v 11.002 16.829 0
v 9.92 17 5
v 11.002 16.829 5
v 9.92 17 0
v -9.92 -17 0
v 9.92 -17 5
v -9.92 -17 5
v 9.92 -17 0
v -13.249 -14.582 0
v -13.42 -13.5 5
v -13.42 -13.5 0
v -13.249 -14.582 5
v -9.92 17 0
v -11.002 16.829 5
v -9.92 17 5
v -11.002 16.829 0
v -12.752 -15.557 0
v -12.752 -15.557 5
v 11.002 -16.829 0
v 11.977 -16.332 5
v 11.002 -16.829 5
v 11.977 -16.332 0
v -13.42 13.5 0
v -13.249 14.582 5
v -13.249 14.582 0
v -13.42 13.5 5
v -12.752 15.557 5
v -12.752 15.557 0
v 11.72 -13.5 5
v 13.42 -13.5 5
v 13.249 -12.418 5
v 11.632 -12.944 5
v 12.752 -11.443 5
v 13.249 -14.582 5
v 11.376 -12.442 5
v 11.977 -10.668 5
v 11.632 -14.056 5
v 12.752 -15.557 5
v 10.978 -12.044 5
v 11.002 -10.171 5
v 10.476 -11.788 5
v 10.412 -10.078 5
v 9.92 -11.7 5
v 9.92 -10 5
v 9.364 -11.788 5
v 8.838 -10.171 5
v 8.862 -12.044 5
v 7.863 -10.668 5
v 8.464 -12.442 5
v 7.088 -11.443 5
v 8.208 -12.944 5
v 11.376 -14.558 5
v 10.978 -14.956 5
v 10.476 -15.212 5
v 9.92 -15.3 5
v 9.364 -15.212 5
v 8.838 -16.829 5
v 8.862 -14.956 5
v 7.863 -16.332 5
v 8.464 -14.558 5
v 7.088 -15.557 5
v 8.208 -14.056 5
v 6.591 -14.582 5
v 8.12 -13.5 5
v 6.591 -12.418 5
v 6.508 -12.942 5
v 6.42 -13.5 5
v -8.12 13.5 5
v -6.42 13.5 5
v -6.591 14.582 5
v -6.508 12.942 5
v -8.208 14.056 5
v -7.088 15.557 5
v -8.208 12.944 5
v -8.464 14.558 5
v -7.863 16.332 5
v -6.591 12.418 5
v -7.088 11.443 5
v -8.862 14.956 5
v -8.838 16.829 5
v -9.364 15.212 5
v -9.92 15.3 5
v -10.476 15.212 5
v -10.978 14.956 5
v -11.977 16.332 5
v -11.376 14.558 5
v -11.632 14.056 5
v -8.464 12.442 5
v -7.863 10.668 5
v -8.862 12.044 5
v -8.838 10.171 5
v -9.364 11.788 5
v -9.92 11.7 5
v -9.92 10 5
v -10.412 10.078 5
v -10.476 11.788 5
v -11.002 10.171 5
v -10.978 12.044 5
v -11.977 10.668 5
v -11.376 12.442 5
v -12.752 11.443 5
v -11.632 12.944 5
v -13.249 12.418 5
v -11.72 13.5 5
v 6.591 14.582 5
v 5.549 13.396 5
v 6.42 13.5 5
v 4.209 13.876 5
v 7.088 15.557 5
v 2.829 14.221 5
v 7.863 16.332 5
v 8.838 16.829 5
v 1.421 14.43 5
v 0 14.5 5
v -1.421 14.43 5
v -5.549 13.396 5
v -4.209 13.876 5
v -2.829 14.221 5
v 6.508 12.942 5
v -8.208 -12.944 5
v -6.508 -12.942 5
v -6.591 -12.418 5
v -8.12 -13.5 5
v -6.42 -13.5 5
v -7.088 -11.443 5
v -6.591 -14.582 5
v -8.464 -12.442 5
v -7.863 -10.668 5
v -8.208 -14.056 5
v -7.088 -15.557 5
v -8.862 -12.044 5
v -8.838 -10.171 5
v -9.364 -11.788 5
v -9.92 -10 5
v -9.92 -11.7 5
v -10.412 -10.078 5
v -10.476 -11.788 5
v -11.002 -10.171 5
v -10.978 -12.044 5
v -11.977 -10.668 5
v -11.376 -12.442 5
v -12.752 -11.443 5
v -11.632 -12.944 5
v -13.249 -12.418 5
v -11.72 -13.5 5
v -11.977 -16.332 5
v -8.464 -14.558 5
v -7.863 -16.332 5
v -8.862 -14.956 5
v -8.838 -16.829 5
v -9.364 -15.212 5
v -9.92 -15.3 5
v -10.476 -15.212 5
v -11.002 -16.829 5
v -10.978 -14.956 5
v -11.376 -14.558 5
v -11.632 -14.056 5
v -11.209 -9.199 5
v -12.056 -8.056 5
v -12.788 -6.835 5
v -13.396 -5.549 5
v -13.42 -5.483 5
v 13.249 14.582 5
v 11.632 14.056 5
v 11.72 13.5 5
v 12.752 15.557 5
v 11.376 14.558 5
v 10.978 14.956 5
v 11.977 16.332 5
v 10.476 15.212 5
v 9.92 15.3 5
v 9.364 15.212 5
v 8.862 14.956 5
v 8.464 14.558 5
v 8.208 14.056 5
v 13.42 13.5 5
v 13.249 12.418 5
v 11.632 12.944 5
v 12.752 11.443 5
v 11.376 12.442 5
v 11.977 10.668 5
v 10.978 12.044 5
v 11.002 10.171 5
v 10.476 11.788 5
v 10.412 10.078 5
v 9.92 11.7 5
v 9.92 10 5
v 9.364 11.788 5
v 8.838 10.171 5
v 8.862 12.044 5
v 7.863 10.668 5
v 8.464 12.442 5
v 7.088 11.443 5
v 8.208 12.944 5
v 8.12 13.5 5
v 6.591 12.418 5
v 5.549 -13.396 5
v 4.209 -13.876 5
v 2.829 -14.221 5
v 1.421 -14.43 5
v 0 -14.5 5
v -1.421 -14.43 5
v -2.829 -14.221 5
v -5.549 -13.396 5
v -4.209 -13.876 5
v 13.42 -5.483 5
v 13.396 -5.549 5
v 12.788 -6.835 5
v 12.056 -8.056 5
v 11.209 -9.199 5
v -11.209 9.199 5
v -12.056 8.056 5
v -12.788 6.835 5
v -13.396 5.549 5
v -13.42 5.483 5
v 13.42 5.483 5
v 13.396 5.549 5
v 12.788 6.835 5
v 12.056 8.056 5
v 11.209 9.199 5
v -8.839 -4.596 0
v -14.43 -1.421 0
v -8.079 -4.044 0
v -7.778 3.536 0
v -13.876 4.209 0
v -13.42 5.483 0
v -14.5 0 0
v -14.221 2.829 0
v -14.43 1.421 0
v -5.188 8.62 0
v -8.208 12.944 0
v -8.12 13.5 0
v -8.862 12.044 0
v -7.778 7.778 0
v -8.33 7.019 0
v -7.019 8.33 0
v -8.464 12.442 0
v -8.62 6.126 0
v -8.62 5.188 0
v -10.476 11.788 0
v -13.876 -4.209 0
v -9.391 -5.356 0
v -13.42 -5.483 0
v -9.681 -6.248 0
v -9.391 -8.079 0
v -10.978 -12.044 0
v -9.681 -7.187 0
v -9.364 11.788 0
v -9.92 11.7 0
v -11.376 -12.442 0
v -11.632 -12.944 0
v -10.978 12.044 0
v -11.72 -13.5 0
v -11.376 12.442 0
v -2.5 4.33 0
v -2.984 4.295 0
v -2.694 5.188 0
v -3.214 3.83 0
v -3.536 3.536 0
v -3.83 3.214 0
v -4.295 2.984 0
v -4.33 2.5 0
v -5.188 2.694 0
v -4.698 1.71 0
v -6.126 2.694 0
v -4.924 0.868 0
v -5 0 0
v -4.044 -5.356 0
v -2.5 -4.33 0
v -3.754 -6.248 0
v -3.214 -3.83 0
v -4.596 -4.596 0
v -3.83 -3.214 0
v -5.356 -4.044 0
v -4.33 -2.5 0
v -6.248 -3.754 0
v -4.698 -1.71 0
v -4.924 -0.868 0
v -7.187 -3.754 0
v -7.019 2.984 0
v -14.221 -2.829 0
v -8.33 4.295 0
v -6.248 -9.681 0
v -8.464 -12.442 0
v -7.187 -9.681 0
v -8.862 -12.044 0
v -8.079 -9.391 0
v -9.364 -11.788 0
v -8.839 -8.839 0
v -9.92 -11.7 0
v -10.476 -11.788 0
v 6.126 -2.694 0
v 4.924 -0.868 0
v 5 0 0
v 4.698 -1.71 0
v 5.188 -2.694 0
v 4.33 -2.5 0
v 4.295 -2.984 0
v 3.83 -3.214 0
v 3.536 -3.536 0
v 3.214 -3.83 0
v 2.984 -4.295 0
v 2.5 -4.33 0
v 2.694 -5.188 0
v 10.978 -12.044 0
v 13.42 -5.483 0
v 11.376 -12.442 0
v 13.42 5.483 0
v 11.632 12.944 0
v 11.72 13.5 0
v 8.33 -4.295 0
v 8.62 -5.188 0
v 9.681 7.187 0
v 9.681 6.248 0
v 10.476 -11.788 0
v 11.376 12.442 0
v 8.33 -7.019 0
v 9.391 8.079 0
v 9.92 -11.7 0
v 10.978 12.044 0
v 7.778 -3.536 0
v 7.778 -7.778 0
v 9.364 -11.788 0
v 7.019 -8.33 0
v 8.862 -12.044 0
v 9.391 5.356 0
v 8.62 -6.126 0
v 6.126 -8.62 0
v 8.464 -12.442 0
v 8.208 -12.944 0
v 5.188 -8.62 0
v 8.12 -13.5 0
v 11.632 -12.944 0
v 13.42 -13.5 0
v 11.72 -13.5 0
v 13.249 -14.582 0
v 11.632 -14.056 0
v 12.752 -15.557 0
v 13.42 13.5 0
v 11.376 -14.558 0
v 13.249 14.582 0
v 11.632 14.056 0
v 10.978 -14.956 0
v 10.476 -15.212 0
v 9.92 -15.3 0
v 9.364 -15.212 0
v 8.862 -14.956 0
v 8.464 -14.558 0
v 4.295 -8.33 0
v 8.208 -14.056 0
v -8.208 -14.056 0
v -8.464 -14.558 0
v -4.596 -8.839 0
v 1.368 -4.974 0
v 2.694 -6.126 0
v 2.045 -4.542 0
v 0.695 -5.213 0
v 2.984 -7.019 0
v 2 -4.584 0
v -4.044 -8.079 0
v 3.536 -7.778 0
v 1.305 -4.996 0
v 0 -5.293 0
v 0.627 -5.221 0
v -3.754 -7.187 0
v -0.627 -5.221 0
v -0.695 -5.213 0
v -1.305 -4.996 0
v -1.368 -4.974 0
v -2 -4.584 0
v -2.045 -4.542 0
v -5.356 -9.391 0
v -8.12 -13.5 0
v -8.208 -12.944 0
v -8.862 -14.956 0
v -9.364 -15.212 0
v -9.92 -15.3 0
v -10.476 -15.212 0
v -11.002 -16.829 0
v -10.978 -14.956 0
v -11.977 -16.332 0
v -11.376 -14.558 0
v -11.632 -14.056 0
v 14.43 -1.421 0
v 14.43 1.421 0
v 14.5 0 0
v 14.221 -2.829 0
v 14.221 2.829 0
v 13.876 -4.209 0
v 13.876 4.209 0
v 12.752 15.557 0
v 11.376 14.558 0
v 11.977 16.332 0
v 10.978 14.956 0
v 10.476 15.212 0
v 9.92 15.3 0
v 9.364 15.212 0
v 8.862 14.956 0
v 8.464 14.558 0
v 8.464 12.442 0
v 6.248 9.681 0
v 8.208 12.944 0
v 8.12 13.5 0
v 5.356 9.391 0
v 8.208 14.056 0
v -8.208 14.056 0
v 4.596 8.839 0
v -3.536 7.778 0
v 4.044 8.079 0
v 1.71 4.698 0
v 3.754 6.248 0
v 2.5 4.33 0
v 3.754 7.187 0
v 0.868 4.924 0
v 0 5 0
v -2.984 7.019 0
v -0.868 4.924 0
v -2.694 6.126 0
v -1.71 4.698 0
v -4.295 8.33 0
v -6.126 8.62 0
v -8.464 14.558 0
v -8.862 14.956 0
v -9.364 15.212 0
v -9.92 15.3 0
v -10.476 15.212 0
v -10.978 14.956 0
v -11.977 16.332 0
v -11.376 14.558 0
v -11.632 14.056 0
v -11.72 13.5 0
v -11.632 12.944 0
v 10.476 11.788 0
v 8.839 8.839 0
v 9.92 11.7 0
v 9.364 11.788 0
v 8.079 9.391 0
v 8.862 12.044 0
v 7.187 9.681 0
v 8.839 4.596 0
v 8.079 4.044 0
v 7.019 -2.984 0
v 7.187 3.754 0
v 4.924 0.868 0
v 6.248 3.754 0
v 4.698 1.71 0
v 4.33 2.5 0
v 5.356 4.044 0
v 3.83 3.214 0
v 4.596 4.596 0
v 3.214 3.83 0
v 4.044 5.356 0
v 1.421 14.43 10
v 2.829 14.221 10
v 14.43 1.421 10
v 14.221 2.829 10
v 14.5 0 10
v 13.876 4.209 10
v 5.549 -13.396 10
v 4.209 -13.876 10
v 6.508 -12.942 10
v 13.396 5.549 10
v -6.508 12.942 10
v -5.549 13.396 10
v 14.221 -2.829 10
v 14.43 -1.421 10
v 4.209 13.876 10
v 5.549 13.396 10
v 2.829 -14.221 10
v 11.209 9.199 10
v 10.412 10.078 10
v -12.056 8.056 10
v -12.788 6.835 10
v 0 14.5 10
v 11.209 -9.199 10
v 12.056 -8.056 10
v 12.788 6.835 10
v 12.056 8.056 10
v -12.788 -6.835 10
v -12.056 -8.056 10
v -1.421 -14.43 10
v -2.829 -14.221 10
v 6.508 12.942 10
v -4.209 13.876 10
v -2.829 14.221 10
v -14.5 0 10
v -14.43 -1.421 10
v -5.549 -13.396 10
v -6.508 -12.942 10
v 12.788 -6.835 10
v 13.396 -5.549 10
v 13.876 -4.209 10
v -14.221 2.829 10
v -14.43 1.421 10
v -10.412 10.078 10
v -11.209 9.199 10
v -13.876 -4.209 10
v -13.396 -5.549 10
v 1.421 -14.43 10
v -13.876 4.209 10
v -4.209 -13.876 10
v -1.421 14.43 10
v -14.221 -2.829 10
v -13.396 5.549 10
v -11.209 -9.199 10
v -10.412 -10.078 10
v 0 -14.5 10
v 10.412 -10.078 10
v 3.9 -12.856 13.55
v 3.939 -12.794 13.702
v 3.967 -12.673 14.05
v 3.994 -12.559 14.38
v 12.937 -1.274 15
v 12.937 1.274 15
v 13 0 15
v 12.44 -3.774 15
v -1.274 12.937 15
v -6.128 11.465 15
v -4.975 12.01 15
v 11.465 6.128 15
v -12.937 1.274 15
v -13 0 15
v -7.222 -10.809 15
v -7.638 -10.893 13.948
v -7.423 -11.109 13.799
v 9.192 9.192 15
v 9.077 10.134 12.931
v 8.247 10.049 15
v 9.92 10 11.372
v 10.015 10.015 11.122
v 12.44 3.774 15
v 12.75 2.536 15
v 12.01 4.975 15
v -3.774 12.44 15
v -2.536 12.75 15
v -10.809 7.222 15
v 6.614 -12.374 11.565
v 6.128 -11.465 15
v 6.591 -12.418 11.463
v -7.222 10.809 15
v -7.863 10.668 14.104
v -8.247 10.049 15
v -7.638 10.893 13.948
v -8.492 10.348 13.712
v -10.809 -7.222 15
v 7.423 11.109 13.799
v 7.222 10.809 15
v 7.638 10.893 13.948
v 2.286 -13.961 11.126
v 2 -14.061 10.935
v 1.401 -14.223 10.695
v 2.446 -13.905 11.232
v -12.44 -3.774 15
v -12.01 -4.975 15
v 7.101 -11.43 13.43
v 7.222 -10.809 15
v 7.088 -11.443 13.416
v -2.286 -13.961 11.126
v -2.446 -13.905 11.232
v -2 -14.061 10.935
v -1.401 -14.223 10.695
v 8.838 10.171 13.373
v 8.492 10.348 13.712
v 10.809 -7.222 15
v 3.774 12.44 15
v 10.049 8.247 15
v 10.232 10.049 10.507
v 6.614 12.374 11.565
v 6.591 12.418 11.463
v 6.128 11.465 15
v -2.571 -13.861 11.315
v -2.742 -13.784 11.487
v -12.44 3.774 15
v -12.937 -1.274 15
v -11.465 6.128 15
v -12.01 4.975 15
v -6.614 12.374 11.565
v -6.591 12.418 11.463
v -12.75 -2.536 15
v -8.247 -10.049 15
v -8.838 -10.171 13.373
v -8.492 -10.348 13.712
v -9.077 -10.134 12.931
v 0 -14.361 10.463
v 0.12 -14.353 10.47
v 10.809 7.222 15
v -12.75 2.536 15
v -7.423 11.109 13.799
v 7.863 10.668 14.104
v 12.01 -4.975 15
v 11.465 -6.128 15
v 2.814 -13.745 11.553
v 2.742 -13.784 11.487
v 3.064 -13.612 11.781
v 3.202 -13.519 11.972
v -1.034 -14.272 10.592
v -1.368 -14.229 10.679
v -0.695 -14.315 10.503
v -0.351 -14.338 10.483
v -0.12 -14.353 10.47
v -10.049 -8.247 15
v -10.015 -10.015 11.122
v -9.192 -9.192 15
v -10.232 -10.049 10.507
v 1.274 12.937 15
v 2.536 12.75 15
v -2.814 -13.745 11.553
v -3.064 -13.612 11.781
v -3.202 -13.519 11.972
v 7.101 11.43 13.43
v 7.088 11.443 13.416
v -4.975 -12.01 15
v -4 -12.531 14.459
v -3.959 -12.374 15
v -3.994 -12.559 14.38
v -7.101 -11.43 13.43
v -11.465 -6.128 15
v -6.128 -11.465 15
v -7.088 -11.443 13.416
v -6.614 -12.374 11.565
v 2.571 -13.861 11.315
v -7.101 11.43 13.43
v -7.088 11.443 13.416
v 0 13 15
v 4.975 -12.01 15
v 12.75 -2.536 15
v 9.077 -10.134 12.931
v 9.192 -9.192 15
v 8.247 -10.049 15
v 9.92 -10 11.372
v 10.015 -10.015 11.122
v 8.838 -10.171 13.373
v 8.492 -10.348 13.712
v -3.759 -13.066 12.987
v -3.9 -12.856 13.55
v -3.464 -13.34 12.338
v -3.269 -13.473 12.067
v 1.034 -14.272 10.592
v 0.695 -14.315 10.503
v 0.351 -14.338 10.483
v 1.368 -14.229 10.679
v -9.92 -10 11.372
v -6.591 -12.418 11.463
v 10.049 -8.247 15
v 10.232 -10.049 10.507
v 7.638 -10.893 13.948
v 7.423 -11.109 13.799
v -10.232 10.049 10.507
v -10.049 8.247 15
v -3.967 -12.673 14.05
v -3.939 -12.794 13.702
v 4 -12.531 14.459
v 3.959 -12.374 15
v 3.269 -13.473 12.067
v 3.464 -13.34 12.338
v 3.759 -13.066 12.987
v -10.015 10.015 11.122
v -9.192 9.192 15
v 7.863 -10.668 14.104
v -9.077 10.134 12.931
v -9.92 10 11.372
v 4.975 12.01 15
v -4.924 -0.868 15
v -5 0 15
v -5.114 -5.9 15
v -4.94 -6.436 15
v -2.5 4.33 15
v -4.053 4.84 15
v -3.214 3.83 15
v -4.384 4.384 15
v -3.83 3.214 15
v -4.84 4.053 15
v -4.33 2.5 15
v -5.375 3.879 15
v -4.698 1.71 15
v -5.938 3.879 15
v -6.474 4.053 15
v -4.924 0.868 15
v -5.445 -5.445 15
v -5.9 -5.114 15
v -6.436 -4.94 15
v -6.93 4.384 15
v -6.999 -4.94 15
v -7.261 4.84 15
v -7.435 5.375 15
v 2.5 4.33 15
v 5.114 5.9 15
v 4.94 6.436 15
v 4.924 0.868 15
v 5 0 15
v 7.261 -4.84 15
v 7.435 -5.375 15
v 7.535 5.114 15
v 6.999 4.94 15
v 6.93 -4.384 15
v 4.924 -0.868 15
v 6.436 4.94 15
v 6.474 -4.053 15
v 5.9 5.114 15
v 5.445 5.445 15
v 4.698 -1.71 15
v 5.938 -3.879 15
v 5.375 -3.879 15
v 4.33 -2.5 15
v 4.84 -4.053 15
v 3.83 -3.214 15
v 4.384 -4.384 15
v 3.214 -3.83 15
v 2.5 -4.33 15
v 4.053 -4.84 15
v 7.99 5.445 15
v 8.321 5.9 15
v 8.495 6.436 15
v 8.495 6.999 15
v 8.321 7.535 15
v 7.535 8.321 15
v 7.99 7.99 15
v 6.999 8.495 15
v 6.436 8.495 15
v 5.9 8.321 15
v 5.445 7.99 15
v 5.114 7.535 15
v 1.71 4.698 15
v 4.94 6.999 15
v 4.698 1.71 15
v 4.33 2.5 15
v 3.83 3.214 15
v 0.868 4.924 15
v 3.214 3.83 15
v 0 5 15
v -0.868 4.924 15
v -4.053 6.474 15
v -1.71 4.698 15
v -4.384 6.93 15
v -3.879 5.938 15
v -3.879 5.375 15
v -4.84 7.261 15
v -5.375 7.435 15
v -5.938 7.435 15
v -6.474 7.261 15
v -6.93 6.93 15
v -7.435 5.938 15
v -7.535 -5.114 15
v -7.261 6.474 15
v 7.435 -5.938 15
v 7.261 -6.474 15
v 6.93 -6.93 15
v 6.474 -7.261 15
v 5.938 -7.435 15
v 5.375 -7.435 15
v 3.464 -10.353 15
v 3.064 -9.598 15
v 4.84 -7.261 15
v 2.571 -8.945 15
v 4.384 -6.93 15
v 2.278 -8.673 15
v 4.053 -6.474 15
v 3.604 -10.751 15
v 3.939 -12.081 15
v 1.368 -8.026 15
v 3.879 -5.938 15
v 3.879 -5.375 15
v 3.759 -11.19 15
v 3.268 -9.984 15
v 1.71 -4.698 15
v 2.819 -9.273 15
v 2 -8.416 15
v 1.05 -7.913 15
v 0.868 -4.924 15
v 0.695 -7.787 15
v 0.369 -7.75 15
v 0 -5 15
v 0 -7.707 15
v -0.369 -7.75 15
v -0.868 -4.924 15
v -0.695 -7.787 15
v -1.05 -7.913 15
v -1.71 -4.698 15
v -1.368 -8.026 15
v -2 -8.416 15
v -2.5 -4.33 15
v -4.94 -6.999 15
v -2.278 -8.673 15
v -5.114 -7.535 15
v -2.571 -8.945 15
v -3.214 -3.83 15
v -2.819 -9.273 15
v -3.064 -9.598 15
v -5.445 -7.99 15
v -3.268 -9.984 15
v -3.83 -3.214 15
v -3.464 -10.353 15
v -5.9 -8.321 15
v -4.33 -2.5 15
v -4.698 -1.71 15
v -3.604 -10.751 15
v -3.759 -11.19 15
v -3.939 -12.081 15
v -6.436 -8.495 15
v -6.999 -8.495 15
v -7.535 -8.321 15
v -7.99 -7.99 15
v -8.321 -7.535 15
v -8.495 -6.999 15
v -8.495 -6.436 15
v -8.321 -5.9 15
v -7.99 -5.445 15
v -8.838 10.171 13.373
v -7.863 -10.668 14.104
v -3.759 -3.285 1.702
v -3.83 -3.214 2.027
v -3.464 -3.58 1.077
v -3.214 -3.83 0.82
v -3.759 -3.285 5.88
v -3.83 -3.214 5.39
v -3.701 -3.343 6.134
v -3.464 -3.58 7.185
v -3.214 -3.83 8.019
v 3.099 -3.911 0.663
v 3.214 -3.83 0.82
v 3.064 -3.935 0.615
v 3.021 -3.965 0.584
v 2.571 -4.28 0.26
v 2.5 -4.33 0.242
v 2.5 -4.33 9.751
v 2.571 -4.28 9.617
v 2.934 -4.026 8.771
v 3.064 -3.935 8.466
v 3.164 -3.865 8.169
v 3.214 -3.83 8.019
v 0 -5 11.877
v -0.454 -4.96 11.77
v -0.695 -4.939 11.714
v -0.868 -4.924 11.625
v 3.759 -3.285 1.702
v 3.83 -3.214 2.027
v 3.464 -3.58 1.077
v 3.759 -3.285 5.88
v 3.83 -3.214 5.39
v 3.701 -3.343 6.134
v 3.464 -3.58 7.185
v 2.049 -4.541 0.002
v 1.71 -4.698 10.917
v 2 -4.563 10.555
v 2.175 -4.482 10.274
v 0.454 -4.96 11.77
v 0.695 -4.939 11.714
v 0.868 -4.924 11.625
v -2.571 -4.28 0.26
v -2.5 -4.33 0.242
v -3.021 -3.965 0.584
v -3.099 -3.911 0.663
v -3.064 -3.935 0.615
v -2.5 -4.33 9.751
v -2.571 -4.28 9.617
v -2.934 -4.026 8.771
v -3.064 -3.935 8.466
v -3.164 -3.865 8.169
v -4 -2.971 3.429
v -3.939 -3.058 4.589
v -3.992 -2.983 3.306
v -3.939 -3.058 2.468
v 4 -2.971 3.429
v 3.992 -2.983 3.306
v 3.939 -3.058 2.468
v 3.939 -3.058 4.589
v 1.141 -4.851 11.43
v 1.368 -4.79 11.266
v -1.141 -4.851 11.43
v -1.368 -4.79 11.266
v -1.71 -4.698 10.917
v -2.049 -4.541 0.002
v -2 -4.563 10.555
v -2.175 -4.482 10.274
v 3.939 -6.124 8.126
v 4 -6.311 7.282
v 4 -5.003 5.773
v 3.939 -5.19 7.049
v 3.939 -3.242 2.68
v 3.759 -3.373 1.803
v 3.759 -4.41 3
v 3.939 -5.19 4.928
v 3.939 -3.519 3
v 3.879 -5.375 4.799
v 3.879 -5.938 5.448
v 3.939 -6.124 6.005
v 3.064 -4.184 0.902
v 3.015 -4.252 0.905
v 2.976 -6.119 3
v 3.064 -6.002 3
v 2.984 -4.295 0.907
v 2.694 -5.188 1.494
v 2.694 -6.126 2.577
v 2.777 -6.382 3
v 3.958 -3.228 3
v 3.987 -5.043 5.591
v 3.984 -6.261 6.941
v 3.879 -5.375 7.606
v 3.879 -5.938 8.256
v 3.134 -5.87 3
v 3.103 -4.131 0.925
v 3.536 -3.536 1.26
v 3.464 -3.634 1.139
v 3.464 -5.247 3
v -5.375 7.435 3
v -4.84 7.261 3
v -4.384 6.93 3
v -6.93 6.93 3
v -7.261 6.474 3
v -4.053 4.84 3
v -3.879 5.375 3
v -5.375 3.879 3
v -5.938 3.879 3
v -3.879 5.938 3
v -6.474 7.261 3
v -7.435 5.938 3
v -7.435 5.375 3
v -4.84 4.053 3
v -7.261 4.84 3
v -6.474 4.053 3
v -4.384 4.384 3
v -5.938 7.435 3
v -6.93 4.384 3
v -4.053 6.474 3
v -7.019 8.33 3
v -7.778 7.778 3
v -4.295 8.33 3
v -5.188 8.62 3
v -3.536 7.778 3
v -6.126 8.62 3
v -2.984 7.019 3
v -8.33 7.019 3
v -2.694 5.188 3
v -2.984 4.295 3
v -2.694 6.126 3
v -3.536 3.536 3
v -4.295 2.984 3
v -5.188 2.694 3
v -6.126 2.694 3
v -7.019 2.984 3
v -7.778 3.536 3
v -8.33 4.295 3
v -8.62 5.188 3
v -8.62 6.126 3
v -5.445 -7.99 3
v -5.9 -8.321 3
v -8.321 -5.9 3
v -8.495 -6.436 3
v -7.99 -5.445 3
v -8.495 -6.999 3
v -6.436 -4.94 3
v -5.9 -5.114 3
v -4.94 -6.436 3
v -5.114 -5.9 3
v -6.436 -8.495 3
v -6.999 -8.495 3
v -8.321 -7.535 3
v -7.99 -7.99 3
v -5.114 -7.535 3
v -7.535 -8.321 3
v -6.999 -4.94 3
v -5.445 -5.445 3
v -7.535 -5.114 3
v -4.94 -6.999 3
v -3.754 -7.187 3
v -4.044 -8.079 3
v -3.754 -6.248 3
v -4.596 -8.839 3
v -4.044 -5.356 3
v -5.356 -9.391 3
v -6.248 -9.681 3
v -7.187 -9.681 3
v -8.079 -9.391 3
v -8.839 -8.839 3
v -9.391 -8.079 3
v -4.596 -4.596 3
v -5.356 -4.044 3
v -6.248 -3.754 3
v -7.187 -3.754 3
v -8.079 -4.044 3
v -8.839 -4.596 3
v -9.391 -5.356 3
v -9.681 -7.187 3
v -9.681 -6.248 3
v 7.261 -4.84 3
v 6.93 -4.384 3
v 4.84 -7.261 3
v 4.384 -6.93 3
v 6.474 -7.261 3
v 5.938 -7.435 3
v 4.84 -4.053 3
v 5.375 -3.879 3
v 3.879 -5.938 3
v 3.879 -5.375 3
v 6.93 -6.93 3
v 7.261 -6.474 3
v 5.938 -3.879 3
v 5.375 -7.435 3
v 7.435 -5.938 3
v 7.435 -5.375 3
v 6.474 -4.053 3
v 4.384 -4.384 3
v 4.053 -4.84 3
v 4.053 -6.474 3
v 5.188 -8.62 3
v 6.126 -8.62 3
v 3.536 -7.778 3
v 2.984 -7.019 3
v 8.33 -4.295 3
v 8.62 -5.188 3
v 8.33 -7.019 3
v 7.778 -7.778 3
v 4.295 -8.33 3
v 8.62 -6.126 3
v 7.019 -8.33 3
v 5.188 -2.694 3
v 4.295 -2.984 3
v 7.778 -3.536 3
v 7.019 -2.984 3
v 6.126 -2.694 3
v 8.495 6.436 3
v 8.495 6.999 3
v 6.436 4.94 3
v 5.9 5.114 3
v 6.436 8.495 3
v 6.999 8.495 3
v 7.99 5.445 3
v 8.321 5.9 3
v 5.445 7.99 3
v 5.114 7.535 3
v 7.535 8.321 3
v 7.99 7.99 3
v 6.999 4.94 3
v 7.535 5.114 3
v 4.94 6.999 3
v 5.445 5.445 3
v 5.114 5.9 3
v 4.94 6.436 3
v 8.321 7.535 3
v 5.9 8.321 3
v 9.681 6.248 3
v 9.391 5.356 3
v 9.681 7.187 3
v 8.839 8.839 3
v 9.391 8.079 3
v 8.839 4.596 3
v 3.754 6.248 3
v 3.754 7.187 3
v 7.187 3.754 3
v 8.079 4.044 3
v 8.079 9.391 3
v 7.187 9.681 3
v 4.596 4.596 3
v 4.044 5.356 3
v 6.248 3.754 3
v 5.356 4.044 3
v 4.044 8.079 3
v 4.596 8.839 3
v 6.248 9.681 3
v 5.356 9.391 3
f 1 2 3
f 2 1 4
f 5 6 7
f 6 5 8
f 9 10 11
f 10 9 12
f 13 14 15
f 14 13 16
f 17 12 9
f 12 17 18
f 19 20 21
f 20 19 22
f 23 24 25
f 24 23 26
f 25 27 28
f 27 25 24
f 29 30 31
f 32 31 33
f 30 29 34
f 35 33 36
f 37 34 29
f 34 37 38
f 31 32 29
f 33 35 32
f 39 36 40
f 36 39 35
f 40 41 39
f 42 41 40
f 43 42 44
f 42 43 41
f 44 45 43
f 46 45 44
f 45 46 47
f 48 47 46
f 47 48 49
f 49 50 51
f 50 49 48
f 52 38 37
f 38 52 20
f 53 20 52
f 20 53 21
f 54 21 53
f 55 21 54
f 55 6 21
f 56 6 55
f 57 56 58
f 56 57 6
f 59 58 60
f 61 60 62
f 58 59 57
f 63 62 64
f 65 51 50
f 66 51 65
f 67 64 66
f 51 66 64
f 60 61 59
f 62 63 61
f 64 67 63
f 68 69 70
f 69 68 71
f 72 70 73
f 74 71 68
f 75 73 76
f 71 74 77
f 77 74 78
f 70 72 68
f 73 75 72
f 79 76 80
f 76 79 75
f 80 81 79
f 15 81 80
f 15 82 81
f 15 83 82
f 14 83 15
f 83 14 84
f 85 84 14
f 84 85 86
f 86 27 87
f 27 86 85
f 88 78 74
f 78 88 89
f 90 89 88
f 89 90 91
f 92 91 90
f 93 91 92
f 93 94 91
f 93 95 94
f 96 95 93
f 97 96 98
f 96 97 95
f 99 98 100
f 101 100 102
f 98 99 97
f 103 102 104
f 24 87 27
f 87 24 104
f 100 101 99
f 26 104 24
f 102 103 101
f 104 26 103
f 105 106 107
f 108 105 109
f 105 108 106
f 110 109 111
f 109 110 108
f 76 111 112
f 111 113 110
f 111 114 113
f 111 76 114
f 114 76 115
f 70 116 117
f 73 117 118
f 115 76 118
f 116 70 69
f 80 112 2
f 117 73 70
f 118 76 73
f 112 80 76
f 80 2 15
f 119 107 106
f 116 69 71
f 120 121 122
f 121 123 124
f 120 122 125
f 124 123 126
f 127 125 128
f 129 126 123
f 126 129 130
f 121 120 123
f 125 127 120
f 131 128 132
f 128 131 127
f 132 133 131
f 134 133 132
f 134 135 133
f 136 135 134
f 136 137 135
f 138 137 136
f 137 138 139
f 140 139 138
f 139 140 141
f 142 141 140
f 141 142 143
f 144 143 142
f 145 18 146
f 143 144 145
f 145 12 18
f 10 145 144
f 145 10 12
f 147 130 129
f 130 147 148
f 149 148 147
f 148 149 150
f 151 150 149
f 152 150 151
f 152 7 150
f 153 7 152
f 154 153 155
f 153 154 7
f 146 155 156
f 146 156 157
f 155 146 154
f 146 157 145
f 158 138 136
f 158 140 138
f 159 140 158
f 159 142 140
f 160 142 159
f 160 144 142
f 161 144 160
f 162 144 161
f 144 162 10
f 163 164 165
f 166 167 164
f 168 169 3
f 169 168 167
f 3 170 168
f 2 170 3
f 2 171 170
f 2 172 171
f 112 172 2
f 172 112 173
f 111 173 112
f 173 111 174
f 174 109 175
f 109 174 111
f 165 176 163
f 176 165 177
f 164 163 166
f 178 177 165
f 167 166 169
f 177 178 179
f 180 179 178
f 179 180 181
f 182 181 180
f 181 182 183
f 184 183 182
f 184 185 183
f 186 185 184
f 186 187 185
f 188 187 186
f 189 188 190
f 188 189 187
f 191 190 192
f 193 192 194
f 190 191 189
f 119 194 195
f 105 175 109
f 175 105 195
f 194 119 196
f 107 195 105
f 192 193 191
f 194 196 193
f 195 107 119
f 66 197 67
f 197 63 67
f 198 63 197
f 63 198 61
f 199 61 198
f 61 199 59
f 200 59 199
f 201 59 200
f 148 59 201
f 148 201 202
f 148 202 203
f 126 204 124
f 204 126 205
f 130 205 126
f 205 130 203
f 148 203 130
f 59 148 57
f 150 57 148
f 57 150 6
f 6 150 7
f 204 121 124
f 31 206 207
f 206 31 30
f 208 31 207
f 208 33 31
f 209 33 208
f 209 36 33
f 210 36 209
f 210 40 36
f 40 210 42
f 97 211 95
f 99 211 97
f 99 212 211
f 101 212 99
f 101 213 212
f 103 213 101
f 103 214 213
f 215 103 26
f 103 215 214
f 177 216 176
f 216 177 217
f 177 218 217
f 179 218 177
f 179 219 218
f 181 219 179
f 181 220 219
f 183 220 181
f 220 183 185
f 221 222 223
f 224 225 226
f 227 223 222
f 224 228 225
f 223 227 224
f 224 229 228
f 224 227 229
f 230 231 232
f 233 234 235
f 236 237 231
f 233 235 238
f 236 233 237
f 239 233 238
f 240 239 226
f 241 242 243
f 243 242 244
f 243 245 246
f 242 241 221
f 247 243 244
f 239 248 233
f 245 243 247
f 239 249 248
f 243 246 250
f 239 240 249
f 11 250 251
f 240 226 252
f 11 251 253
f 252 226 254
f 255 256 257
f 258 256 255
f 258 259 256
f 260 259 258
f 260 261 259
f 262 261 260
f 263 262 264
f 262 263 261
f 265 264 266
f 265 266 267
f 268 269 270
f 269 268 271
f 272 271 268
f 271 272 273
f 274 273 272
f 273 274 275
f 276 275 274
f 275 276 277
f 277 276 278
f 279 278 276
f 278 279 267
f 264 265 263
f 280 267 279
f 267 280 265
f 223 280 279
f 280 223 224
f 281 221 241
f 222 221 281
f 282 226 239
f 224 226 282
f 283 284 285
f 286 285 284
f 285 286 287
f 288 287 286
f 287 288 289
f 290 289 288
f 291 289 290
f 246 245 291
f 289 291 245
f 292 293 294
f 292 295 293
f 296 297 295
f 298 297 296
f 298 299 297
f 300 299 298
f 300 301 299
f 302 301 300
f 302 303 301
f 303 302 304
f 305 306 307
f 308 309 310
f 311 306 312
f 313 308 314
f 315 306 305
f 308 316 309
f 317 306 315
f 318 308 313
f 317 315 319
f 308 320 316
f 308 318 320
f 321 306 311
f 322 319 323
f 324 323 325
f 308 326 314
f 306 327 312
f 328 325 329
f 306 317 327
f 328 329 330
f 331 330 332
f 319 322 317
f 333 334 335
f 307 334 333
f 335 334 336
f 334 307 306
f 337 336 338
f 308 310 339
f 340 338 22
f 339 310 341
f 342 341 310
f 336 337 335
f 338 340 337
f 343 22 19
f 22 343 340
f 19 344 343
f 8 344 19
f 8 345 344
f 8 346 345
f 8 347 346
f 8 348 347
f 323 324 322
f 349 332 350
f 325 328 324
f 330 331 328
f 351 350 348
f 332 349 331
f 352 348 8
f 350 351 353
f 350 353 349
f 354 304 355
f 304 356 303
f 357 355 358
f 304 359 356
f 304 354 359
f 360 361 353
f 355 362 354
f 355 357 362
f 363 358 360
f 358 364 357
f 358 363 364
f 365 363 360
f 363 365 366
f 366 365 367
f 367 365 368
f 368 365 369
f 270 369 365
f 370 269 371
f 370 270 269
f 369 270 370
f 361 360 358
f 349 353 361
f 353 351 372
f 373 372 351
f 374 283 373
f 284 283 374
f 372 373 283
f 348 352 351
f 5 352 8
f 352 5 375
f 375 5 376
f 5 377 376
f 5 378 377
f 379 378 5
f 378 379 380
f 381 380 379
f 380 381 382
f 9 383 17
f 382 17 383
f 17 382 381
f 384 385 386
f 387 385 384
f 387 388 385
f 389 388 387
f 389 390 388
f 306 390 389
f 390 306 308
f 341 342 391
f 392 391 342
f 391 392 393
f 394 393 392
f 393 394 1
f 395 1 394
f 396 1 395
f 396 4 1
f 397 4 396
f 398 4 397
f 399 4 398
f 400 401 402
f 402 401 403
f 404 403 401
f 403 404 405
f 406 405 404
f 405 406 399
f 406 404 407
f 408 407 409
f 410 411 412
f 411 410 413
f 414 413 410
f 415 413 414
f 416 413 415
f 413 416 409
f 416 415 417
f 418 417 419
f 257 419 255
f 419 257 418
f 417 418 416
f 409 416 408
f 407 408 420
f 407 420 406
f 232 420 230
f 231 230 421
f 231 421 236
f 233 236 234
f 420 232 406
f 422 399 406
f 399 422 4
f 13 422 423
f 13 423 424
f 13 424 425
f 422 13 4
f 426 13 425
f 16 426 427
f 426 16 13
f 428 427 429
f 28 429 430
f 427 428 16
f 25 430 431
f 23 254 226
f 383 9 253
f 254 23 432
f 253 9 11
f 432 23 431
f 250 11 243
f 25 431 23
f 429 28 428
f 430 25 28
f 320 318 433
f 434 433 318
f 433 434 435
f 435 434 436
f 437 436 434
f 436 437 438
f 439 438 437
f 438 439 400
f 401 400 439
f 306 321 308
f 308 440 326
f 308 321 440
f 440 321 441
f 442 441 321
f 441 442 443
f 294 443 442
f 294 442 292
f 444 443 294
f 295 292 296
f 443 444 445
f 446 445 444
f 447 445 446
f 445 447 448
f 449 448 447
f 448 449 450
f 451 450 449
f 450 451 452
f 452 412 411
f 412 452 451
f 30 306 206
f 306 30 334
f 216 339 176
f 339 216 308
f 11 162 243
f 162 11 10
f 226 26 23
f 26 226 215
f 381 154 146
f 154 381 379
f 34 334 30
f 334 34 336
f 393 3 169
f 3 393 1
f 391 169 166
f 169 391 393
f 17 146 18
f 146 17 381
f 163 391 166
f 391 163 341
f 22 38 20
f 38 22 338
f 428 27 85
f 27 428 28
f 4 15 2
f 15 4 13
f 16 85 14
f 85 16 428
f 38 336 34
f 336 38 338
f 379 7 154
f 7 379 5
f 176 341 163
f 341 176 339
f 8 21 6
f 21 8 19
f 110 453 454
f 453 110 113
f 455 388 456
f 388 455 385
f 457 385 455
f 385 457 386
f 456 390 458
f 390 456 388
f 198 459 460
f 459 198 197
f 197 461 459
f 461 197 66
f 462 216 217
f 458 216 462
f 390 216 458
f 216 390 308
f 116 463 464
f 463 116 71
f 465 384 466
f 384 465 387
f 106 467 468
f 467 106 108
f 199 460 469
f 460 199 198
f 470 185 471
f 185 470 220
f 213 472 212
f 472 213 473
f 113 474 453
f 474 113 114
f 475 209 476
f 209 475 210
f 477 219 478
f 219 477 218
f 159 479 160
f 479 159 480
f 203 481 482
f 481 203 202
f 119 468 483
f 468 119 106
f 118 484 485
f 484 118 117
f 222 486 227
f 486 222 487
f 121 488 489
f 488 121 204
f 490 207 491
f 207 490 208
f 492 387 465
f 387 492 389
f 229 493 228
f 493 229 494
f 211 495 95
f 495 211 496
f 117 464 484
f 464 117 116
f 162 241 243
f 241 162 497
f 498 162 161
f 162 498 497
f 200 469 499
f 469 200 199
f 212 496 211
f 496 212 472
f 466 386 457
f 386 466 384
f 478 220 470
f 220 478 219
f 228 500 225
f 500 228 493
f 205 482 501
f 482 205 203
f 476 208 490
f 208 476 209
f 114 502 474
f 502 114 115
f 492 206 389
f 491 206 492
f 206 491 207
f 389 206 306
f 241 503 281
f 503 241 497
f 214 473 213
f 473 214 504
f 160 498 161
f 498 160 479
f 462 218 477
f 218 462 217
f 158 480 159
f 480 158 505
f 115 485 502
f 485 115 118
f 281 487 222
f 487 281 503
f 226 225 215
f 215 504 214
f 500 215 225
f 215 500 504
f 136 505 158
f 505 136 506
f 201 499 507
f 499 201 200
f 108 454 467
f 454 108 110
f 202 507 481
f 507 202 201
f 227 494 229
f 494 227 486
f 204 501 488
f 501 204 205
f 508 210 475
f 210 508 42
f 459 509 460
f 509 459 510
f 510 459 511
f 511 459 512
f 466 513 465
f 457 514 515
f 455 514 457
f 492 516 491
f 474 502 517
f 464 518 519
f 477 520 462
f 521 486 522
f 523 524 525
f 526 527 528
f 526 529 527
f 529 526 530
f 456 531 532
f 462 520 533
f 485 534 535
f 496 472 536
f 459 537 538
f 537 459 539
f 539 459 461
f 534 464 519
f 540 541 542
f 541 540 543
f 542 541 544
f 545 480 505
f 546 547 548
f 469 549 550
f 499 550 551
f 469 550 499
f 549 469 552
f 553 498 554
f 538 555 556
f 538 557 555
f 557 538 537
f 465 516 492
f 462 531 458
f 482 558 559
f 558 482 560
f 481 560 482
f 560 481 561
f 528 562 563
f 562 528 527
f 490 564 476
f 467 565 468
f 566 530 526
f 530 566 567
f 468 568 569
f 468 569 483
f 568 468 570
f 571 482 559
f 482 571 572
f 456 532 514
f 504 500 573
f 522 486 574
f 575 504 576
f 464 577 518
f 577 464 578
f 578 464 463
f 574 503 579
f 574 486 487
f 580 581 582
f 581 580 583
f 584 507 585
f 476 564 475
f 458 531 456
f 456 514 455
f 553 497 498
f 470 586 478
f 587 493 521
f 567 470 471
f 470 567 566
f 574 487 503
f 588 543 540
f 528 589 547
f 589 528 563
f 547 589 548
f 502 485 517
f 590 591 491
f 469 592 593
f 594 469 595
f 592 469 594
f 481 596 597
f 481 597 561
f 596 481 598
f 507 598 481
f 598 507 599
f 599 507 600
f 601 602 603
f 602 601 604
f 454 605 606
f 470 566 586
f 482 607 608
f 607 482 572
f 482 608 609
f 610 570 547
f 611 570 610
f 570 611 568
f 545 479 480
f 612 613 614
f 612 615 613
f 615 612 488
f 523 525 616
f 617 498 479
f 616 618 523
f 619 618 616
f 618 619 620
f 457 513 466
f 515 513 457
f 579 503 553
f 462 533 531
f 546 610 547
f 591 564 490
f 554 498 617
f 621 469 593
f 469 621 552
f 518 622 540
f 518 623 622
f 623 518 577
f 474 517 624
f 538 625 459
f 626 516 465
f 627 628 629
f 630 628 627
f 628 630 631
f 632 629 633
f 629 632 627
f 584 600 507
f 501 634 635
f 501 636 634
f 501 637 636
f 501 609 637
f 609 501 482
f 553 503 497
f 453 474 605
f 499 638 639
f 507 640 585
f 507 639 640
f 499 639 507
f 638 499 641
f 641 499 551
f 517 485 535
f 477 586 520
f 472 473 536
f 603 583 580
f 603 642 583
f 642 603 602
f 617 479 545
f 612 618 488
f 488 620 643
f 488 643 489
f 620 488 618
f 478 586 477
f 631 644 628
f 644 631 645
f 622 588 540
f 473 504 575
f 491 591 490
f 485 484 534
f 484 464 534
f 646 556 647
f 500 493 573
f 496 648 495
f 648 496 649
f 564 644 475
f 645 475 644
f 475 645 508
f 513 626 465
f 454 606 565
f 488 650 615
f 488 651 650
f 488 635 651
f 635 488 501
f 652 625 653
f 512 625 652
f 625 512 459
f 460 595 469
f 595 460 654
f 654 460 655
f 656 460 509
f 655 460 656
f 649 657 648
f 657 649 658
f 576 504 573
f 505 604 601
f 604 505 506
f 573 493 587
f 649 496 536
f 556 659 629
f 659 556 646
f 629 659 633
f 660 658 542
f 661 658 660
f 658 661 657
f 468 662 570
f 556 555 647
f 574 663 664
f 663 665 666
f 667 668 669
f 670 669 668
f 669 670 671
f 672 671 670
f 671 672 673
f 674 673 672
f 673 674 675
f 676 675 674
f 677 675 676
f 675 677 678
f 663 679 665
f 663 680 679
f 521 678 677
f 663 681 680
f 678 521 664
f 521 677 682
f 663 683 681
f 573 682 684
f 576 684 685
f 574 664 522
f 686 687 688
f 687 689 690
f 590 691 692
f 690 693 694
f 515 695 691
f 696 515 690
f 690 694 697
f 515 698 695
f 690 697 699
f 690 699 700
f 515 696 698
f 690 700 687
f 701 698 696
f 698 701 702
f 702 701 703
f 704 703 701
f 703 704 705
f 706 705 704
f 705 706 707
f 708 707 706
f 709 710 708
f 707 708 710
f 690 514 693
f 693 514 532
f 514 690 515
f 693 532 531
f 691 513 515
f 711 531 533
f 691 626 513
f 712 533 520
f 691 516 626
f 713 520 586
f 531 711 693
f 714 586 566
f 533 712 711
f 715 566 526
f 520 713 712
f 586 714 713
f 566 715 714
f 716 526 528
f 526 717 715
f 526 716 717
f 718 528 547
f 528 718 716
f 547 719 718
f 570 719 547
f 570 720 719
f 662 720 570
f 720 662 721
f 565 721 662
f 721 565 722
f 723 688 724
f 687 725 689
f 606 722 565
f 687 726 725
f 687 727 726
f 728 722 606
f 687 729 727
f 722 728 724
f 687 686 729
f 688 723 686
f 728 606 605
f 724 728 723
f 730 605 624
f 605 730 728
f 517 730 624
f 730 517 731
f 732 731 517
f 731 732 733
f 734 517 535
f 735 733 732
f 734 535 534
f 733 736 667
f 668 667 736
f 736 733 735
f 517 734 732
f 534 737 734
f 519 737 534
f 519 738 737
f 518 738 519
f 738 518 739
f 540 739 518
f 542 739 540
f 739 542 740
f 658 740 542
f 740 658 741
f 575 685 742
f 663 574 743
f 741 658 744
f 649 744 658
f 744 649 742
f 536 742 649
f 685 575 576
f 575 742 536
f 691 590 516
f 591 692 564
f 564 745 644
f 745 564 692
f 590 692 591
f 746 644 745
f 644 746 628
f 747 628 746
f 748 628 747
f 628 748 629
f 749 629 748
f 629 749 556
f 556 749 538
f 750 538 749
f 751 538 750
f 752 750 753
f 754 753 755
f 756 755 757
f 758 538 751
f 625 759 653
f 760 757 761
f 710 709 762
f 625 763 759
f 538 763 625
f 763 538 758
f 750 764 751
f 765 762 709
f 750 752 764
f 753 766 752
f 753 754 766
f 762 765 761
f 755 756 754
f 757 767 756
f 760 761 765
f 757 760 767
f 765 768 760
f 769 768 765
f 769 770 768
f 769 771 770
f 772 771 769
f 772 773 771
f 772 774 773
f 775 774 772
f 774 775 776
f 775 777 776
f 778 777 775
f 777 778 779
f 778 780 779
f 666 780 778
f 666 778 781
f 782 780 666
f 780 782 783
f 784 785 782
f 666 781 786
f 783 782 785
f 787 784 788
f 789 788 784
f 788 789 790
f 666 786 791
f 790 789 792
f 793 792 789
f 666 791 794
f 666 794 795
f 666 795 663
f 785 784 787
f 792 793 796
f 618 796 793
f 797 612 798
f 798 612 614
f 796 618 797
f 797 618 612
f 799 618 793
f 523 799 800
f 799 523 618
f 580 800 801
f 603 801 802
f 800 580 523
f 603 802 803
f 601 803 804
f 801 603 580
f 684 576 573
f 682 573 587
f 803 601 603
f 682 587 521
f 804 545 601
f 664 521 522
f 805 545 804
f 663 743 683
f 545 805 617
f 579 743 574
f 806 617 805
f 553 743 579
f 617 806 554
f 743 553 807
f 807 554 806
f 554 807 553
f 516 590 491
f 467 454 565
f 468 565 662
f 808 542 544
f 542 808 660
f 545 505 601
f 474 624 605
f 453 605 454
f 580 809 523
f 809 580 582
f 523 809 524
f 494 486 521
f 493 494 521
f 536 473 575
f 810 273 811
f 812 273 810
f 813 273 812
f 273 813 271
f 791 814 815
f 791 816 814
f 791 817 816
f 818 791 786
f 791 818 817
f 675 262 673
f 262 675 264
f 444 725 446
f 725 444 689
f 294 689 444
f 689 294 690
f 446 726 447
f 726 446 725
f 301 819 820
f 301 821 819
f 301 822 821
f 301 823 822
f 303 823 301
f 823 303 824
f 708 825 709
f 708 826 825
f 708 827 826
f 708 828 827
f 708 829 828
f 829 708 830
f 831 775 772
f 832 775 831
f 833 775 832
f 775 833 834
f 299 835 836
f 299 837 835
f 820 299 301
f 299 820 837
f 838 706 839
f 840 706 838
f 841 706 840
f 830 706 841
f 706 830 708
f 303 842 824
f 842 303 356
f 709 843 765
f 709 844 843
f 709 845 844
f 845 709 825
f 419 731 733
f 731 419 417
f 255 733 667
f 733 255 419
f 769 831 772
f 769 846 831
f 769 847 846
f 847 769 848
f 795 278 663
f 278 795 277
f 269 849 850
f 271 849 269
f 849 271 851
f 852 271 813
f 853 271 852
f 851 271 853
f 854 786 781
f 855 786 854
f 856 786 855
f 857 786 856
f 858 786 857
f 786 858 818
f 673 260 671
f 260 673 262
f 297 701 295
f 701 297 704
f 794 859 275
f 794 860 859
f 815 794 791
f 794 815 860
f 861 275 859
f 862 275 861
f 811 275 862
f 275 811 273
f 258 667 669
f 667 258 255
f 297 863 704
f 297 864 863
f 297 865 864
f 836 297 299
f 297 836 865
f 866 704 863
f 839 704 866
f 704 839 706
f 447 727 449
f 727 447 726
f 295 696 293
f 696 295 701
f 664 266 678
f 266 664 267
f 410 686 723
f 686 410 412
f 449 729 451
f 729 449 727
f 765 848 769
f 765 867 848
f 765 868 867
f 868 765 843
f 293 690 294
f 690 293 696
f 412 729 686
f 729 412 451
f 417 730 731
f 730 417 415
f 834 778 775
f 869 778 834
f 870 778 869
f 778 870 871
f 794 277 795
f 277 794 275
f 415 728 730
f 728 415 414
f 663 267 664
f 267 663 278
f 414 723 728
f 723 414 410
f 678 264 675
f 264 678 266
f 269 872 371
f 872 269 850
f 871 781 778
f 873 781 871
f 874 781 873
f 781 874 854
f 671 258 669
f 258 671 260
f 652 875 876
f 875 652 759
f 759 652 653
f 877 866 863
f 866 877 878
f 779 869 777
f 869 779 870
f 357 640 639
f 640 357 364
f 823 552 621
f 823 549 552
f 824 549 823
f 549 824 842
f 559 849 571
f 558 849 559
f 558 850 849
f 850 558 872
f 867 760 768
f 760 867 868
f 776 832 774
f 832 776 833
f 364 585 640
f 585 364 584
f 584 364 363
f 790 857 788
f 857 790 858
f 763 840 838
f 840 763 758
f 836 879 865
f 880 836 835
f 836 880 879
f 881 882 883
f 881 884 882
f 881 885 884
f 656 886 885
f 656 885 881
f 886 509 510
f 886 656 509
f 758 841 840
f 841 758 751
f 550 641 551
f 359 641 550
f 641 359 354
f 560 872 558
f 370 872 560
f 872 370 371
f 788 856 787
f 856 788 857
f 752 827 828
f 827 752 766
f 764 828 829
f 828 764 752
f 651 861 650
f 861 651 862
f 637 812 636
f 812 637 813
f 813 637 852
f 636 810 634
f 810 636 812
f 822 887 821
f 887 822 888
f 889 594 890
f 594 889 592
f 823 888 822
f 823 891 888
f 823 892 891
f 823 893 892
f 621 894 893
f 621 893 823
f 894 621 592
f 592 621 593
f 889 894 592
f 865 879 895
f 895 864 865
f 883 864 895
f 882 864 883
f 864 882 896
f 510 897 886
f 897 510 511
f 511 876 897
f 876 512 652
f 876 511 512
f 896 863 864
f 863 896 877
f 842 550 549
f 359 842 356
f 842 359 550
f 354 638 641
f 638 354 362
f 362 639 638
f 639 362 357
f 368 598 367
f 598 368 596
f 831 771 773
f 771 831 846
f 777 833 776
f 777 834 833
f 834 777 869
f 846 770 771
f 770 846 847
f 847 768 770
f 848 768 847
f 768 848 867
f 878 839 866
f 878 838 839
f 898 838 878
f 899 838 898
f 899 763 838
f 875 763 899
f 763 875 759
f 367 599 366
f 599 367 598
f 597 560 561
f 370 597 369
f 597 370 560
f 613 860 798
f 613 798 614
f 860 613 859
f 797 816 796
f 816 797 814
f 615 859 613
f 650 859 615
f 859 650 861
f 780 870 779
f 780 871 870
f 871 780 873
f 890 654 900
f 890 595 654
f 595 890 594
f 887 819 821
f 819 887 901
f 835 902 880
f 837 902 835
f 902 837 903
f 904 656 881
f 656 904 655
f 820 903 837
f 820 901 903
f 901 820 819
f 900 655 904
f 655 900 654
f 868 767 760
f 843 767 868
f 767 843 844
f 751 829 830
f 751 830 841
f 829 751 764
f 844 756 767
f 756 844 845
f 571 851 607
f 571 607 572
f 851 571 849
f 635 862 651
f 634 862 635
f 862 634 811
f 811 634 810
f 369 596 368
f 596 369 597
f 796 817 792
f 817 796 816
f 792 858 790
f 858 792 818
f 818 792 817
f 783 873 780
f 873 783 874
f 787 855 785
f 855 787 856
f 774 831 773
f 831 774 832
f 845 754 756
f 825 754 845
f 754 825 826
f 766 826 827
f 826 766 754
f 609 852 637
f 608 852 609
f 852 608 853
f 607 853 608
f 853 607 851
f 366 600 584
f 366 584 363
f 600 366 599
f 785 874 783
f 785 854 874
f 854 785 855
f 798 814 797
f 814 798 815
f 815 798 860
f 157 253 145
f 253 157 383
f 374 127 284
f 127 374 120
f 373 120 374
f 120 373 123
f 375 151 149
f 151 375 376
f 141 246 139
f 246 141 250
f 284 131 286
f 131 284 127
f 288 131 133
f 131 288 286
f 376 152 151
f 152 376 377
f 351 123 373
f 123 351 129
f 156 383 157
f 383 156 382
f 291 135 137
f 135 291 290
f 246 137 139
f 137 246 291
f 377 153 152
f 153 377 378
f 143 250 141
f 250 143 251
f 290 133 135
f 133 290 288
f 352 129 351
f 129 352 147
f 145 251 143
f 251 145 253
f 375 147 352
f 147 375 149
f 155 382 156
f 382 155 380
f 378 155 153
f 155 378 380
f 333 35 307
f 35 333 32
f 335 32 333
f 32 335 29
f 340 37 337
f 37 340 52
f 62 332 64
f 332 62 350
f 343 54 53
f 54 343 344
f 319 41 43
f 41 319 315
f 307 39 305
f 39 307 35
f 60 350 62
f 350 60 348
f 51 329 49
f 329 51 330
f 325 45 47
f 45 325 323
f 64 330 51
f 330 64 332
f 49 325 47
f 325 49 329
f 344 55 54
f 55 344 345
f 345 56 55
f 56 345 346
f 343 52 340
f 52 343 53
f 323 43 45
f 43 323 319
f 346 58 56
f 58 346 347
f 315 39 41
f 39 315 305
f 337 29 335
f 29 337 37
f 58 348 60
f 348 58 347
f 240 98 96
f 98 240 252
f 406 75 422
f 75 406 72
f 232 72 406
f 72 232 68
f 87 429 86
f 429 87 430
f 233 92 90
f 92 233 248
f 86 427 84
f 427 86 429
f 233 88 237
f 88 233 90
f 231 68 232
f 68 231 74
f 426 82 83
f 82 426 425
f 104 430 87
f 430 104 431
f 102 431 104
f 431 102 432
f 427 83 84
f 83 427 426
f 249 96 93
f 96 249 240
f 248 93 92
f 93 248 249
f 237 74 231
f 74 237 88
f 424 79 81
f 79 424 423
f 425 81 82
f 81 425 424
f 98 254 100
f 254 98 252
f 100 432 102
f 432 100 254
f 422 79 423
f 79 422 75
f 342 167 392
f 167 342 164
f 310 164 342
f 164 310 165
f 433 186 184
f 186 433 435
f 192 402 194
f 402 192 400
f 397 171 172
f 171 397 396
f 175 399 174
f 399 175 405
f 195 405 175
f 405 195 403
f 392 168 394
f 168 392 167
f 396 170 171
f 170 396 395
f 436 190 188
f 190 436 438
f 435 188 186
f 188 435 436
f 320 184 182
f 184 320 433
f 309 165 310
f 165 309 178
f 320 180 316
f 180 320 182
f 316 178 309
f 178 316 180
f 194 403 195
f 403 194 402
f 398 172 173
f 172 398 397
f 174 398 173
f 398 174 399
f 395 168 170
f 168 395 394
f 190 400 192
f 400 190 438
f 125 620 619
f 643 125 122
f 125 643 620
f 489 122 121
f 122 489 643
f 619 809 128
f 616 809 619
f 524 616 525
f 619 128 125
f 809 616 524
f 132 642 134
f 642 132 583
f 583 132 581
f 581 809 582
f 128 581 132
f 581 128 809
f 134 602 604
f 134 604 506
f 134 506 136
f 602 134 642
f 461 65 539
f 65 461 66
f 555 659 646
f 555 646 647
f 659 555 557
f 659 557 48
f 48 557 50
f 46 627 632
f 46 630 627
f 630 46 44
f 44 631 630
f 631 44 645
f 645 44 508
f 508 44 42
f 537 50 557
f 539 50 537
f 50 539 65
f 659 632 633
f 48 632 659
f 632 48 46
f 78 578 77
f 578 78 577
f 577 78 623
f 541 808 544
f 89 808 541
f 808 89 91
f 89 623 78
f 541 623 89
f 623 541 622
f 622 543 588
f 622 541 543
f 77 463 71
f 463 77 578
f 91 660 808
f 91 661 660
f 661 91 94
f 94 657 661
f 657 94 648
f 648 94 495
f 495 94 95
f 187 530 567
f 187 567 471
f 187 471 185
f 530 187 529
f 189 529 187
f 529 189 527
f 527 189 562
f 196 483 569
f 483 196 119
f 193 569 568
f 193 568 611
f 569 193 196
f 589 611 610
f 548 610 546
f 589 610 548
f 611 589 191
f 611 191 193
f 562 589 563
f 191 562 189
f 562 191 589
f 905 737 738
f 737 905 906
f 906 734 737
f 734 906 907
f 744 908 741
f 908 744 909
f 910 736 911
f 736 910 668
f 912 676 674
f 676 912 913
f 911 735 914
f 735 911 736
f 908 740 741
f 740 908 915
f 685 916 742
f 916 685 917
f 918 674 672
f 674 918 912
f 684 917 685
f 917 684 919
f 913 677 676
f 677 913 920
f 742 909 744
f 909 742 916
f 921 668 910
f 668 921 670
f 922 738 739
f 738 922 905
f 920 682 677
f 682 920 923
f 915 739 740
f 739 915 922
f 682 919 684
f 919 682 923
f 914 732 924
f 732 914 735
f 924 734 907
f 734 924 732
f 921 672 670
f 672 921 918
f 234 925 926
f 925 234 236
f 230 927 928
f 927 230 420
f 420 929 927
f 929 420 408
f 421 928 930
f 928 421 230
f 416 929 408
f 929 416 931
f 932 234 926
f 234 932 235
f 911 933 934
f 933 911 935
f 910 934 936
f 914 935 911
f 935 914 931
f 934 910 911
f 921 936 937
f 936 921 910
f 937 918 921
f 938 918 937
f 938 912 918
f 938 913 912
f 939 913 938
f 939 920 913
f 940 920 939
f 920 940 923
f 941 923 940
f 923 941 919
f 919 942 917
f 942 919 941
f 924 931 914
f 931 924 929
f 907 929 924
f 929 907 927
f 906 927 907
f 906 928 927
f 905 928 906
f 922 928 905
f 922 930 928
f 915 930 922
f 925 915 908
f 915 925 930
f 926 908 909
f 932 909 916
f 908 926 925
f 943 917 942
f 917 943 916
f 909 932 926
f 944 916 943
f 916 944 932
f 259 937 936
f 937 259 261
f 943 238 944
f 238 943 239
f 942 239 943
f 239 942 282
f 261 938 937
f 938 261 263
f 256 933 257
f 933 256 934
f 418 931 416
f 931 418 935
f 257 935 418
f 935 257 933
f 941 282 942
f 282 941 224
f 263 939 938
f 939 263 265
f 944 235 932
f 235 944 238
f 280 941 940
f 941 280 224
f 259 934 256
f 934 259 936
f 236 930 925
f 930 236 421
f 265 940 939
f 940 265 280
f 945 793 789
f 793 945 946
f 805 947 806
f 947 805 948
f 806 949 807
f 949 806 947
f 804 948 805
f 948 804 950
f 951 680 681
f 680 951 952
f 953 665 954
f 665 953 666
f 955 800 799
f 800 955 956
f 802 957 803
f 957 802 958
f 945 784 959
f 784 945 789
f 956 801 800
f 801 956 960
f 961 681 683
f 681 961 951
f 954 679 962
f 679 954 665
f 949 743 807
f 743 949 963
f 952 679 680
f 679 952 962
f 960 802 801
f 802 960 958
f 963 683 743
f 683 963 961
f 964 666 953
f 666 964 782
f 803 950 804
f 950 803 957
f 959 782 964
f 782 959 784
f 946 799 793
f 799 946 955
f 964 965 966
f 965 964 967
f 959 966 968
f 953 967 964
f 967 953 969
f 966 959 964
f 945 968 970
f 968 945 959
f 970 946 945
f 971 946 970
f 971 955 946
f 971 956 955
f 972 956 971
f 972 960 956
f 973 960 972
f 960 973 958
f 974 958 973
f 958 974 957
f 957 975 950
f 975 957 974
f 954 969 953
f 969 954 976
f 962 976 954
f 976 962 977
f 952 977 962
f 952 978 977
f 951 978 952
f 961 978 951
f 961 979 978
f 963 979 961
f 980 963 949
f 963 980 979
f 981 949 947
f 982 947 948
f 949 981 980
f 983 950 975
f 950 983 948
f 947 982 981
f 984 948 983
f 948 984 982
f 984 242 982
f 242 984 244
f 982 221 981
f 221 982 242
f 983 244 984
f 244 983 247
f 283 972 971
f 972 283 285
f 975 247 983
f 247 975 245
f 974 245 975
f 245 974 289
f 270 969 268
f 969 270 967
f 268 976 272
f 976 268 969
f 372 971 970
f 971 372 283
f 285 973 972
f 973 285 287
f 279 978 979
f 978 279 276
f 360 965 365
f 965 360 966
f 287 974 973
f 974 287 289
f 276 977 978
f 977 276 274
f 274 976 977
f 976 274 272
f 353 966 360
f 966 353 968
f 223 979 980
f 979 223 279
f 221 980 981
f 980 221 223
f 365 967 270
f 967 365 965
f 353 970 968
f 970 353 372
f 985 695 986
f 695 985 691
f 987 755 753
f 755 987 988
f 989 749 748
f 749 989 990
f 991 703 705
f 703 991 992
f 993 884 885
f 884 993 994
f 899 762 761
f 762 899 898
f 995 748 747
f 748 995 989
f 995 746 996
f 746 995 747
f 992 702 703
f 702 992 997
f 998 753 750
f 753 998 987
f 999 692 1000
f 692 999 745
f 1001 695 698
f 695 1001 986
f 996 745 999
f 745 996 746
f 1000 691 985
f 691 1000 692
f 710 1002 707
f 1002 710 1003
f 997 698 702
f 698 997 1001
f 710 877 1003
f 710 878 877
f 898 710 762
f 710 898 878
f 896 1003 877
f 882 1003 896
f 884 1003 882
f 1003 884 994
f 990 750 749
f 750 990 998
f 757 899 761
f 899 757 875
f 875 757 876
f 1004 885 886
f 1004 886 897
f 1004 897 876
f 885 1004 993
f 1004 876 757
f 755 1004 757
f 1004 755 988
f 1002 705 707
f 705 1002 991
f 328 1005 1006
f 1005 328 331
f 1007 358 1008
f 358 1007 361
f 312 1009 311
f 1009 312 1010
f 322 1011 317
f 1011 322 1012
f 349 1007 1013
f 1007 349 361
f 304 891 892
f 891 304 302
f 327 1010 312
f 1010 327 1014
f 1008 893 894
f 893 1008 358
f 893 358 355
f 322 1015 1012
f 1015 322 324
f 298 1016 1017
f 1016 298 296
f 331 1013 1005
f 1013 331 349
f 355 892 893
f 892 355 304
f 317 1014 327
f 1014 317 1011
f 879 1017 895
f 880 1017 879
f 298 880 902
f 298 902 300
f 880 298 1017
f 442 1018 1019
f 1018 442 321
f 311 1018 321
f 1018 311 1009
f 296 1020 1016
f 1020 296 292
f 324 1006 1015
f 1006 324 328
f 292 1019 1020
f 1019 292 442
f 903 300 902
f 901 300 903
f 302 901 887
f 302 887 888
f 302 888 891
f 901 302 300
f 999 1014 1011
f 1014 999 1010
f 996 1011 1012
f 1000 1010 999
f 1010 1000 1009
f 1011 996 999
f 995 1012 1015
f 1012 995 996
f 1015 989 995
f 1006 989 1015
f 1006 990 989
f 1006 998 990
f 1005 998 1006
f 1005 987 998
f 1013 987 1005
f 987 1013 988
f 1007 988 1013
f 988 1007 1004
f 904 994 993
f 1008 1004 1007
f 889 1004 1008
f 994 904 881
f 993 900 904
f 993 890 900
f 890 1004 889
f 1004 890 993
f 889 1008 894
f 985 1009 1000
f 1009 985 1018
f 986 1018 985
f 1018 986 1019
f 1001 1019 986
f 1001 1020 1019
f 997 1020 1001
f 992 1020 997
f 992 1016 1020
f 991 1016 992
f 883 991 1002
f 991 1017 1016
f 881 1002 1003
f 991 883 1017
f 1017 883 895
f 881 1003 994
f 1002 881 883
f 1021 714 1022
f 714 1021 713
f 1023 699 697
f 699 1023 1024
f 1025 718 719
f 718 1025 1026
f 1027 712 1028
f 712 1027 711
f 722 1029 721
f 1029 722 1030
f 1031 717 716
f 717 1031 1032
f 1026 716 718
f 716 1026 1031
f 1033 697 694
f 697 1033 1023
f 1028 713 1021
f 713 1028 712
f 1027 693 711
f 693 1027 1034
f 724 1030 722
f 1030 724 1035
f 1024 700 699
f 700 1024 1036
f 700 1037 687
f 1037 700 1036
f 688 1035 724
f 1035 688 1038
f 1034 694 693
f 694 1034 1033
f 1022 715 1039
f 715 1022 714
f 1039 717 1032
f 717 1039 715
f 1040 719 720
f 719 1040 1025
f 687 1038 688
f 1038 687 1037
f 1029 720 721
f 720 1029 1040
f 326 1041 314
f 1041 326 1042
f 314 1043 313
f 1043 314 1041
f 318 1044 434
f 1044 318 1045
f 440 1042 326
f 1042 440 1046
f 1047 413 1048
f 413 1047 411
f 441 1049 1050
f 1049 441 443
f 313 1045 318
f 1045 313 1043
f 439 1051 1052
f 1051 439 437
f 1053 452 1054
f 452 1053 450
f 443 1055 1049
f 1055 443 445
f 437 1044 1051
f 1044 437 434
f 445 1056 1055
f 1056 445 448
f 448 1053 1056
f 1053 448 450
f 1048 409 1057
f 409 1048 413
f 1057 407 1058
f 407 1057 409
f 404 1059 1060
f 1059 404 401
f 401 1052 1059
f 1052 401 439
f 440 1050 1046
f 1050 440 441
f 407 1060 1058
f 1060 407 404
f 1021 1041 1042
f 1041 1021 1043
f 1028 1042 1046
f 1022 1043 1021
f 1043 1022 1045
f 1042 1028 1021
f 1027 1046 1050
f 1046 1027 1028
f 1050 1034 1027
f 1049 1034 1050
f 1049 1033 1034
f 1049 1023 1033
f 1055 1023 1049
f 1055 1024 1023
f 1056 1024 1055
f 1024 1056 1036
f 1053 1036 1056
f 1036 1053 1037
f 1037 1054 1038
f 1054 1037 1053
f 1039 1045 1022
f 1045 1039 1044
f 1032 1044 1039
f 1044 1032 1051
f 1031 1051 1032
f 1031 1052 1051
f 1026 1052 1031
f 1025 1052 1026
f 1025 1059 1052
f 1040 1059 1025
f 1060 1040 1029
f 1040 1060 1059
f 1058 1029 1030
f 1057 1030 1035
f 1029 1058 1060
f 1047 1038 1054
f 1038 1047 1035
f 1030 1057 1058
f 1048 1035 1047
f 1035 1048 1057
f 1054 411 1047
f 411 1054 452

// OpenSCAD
//Brushless-cox mount.
//Parametric.
//Oktay Gülmez, 6/11/2014.
//GNU_GPL_V3


//Parameters:
//-45 degree motor mount holes distance(16 or 19).
a=16;
//+45 degree motor mount holes distance(16 or 19).
b=19; 
//Block height(10 to 30).
height=15; 


$fn=20;

difference(){
  union(){
    minkowski(){
      translate([-9.92,-13.5,0]) cube([19.84,27,4]);
        cylinder(r=3.5);
    }

   translate([0,0,0]) cylinder(h=height-5, r=14.5, $fn=64);
   translate([0,0,height-5]) cylinder(h=5, r1=14.5, r2=13, $fn=64);

   
  }
   translate([0,0,-1]) cylinder(h=50, r=5, $fn=36);

   translate([0,0,0]) rotate([atan(13/height),0,0]) cylinder(h=height+20, r=4, $fn=36);

   translate([-9.92,-13.5,-1]) cylinder(h=10, r=1.8); 
   translate([9.92,-13.5,-1]) cylinder(h=10, r=1.8); 
   translate([-9.92,13.5,-1]) cylinder(h=10, r=1.8); 
   translate([9.92,13.5,-1]) cylinder(h=10, r=1.8);

   translate([-9.92,-13.5,5]) cylinder(h=50, r=3.5); 
   translate([9.92,-13.5,5]) cylinder(h=50, r=3.5); 
   translate([-9.92,13.5,5]) cylinder(h=50, r=3.5); 
   translate([9.92,13.5,5]) cylinder(h=50, r=3.5);

   rotate([0, 0, 45])
    translate([0, a/2, -1])
    cylinder(h=50, r=1.8);
   rotate([0, 0, 45])
    translate([0, a/2, -1])
    cylinder(h=4, r=3);

  rotate([0, 0, 135])
    translate([0, b/2, -1])
    cylinder(h=50, r=1.8);
  rotate([0, 0, 135])
    translate([0, b/2, -1])
    cylinder(h=4, r=3);

  rotate([0, 0, 225])
    translate([0, a/2, -1])
    cylinder(h=50, r=1.8);
  rotate([0, 0, 225])
    translate([0, a/2, -1])
    cylinder(h=4, r=3);

   rotate([0, 0, 315])
    translate([0, b/2, -1])
    cylinder(h=50, r=1.8);
   rotate([0, 0, 315])
    translate([0, b/2, -1])
    cylinder(h=4, r=3);

}
